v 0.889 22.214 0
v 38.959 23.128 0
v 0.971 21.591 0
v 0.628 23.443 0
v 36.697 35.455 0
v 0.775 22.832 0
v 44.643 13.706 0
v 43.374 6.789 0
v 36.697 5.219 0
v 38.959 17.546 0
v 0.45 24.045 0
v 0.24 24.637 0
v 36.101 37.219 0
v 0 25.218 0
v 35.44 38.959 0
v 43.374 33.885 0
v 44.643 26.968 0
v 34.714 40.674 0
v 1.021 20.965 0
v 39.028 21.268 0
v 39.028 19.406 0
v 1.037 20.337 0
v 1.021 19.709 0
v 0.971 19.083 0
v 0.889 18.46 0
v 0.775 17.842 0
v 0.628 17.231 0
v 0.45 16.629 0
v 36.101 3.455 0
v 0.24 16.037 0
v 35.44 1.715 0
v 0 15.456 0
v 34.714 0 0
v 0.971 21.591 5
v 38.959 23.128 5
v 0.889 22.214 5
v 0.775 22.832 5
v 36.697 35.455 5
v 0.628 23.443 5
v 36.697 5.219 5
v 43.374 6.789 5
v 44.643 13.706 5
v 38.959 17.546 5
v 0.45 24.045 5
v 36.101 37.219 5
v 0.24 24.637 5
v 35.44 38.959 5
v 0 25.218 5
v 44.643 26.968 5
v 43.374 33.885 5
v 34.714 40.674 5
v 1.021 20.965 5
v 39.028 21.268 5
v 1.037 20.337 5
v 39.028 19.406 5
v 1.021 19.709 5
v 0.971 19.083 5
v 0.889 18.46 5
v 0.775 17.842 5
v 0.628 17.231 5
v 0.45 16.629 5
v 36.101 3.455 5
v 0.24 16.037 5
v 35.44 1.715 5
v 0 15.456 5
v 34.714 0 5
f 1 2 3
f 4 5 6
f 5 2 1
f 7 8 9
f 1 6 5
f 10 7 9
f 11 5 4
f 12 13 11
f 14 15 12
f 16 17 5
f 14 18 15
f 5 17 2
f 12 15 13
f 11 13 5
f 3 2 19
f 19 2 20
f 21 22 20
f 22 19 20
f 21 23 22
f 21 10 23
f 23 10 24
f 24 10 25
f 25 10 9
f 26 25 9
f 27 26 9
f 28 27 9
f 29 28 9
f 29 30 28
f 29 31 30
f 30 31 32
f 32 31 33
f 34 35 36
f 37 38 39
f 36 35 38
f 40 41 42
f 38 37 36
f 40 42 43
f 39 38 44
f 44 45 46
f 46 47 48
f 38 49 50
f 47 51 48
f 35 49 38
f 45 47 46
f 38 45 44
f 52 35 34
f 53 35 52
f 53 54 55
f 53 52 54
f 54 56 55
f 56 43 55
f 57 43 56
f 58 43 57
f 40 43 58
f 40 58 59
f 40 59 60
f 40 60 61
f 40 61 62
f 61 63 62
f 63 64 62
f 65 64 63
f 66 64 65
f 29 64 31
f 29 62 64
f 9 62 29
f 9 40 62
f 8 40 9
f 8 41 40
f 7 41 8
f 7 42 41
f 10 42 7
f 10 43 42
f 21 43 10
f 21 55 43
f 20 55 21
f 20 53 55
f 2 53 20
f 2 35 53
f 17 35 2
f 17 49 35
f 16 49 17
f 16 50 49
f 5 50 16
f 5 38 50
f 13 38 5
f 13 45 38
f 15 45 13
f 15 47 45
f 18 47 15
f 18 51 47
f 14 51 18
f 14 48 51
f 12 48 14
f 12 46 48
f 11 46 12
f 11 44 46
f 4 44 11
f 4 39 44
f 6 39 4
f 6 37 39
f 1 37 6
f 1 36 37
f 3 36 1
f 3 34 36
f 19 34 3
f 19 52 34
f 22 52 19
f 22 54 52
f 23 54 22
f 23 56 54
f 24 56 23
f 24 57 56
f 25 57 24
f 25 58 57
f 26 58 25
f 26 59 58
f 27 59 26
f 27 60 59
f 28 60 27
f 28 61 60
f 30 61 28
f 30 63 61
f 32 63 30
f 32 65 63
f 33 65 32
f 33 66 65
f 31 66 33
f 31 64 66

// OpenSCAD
$fn = 32;

// ----------------------------------------------------------------------
// Gear sector: 2 teeth on 48 degrees
// ----------------------------------------------------------------------

// --- parameters (mm) ---
sector_angle = 48;        // sector angle, degrees
root_r = 50;              // root circle radius
tooth_h = 6;              // tooth height over the root circle
teeth = 2;                // number of teeth on the sector
hub_r = 12;               // hub bore radius
plate_t = 5;              // sector thickness, Z
arc_step = 3;             // sampling step of the root/hub arcs, degrees

tip_r = root_r + tooth_h;  // tip circle radius

profile = [[34.714, 0], [35.44, 1.715], [36.101, 3.455], [36.697, 5.219], [43.374, 6.789], [44.643, 13.706], [38.959, 17.546], [39.028, 19.406], [39.028, 21.268], [38.959, 23.128], [44.643, 26.968], [43.374, 33.885], [36.697, 35.455], [36.101, 37.219], [35.44, 38.959], [34.714, 40.674], [0, 25.218], [0.24, 24.637], [0.45, 24.045], [0.628, 23.443], [0.775, 22.832], [0.889, 22.214], [0.971, 21.591], [1.021, 20.965], [1.037, 20.337], [1.021, 19.709], [0.971, 19.083], [0.889, 18.46], [0.775, 17.842], [0.628, 17.231], [0.45, 16.629], [0.24, 16.037], [0, 15.456]];  // primary outline, 33 points, counter clockwise

// --- the one profile operation ---
linear_extrude(height = plate_t) polygon(points = profile);
